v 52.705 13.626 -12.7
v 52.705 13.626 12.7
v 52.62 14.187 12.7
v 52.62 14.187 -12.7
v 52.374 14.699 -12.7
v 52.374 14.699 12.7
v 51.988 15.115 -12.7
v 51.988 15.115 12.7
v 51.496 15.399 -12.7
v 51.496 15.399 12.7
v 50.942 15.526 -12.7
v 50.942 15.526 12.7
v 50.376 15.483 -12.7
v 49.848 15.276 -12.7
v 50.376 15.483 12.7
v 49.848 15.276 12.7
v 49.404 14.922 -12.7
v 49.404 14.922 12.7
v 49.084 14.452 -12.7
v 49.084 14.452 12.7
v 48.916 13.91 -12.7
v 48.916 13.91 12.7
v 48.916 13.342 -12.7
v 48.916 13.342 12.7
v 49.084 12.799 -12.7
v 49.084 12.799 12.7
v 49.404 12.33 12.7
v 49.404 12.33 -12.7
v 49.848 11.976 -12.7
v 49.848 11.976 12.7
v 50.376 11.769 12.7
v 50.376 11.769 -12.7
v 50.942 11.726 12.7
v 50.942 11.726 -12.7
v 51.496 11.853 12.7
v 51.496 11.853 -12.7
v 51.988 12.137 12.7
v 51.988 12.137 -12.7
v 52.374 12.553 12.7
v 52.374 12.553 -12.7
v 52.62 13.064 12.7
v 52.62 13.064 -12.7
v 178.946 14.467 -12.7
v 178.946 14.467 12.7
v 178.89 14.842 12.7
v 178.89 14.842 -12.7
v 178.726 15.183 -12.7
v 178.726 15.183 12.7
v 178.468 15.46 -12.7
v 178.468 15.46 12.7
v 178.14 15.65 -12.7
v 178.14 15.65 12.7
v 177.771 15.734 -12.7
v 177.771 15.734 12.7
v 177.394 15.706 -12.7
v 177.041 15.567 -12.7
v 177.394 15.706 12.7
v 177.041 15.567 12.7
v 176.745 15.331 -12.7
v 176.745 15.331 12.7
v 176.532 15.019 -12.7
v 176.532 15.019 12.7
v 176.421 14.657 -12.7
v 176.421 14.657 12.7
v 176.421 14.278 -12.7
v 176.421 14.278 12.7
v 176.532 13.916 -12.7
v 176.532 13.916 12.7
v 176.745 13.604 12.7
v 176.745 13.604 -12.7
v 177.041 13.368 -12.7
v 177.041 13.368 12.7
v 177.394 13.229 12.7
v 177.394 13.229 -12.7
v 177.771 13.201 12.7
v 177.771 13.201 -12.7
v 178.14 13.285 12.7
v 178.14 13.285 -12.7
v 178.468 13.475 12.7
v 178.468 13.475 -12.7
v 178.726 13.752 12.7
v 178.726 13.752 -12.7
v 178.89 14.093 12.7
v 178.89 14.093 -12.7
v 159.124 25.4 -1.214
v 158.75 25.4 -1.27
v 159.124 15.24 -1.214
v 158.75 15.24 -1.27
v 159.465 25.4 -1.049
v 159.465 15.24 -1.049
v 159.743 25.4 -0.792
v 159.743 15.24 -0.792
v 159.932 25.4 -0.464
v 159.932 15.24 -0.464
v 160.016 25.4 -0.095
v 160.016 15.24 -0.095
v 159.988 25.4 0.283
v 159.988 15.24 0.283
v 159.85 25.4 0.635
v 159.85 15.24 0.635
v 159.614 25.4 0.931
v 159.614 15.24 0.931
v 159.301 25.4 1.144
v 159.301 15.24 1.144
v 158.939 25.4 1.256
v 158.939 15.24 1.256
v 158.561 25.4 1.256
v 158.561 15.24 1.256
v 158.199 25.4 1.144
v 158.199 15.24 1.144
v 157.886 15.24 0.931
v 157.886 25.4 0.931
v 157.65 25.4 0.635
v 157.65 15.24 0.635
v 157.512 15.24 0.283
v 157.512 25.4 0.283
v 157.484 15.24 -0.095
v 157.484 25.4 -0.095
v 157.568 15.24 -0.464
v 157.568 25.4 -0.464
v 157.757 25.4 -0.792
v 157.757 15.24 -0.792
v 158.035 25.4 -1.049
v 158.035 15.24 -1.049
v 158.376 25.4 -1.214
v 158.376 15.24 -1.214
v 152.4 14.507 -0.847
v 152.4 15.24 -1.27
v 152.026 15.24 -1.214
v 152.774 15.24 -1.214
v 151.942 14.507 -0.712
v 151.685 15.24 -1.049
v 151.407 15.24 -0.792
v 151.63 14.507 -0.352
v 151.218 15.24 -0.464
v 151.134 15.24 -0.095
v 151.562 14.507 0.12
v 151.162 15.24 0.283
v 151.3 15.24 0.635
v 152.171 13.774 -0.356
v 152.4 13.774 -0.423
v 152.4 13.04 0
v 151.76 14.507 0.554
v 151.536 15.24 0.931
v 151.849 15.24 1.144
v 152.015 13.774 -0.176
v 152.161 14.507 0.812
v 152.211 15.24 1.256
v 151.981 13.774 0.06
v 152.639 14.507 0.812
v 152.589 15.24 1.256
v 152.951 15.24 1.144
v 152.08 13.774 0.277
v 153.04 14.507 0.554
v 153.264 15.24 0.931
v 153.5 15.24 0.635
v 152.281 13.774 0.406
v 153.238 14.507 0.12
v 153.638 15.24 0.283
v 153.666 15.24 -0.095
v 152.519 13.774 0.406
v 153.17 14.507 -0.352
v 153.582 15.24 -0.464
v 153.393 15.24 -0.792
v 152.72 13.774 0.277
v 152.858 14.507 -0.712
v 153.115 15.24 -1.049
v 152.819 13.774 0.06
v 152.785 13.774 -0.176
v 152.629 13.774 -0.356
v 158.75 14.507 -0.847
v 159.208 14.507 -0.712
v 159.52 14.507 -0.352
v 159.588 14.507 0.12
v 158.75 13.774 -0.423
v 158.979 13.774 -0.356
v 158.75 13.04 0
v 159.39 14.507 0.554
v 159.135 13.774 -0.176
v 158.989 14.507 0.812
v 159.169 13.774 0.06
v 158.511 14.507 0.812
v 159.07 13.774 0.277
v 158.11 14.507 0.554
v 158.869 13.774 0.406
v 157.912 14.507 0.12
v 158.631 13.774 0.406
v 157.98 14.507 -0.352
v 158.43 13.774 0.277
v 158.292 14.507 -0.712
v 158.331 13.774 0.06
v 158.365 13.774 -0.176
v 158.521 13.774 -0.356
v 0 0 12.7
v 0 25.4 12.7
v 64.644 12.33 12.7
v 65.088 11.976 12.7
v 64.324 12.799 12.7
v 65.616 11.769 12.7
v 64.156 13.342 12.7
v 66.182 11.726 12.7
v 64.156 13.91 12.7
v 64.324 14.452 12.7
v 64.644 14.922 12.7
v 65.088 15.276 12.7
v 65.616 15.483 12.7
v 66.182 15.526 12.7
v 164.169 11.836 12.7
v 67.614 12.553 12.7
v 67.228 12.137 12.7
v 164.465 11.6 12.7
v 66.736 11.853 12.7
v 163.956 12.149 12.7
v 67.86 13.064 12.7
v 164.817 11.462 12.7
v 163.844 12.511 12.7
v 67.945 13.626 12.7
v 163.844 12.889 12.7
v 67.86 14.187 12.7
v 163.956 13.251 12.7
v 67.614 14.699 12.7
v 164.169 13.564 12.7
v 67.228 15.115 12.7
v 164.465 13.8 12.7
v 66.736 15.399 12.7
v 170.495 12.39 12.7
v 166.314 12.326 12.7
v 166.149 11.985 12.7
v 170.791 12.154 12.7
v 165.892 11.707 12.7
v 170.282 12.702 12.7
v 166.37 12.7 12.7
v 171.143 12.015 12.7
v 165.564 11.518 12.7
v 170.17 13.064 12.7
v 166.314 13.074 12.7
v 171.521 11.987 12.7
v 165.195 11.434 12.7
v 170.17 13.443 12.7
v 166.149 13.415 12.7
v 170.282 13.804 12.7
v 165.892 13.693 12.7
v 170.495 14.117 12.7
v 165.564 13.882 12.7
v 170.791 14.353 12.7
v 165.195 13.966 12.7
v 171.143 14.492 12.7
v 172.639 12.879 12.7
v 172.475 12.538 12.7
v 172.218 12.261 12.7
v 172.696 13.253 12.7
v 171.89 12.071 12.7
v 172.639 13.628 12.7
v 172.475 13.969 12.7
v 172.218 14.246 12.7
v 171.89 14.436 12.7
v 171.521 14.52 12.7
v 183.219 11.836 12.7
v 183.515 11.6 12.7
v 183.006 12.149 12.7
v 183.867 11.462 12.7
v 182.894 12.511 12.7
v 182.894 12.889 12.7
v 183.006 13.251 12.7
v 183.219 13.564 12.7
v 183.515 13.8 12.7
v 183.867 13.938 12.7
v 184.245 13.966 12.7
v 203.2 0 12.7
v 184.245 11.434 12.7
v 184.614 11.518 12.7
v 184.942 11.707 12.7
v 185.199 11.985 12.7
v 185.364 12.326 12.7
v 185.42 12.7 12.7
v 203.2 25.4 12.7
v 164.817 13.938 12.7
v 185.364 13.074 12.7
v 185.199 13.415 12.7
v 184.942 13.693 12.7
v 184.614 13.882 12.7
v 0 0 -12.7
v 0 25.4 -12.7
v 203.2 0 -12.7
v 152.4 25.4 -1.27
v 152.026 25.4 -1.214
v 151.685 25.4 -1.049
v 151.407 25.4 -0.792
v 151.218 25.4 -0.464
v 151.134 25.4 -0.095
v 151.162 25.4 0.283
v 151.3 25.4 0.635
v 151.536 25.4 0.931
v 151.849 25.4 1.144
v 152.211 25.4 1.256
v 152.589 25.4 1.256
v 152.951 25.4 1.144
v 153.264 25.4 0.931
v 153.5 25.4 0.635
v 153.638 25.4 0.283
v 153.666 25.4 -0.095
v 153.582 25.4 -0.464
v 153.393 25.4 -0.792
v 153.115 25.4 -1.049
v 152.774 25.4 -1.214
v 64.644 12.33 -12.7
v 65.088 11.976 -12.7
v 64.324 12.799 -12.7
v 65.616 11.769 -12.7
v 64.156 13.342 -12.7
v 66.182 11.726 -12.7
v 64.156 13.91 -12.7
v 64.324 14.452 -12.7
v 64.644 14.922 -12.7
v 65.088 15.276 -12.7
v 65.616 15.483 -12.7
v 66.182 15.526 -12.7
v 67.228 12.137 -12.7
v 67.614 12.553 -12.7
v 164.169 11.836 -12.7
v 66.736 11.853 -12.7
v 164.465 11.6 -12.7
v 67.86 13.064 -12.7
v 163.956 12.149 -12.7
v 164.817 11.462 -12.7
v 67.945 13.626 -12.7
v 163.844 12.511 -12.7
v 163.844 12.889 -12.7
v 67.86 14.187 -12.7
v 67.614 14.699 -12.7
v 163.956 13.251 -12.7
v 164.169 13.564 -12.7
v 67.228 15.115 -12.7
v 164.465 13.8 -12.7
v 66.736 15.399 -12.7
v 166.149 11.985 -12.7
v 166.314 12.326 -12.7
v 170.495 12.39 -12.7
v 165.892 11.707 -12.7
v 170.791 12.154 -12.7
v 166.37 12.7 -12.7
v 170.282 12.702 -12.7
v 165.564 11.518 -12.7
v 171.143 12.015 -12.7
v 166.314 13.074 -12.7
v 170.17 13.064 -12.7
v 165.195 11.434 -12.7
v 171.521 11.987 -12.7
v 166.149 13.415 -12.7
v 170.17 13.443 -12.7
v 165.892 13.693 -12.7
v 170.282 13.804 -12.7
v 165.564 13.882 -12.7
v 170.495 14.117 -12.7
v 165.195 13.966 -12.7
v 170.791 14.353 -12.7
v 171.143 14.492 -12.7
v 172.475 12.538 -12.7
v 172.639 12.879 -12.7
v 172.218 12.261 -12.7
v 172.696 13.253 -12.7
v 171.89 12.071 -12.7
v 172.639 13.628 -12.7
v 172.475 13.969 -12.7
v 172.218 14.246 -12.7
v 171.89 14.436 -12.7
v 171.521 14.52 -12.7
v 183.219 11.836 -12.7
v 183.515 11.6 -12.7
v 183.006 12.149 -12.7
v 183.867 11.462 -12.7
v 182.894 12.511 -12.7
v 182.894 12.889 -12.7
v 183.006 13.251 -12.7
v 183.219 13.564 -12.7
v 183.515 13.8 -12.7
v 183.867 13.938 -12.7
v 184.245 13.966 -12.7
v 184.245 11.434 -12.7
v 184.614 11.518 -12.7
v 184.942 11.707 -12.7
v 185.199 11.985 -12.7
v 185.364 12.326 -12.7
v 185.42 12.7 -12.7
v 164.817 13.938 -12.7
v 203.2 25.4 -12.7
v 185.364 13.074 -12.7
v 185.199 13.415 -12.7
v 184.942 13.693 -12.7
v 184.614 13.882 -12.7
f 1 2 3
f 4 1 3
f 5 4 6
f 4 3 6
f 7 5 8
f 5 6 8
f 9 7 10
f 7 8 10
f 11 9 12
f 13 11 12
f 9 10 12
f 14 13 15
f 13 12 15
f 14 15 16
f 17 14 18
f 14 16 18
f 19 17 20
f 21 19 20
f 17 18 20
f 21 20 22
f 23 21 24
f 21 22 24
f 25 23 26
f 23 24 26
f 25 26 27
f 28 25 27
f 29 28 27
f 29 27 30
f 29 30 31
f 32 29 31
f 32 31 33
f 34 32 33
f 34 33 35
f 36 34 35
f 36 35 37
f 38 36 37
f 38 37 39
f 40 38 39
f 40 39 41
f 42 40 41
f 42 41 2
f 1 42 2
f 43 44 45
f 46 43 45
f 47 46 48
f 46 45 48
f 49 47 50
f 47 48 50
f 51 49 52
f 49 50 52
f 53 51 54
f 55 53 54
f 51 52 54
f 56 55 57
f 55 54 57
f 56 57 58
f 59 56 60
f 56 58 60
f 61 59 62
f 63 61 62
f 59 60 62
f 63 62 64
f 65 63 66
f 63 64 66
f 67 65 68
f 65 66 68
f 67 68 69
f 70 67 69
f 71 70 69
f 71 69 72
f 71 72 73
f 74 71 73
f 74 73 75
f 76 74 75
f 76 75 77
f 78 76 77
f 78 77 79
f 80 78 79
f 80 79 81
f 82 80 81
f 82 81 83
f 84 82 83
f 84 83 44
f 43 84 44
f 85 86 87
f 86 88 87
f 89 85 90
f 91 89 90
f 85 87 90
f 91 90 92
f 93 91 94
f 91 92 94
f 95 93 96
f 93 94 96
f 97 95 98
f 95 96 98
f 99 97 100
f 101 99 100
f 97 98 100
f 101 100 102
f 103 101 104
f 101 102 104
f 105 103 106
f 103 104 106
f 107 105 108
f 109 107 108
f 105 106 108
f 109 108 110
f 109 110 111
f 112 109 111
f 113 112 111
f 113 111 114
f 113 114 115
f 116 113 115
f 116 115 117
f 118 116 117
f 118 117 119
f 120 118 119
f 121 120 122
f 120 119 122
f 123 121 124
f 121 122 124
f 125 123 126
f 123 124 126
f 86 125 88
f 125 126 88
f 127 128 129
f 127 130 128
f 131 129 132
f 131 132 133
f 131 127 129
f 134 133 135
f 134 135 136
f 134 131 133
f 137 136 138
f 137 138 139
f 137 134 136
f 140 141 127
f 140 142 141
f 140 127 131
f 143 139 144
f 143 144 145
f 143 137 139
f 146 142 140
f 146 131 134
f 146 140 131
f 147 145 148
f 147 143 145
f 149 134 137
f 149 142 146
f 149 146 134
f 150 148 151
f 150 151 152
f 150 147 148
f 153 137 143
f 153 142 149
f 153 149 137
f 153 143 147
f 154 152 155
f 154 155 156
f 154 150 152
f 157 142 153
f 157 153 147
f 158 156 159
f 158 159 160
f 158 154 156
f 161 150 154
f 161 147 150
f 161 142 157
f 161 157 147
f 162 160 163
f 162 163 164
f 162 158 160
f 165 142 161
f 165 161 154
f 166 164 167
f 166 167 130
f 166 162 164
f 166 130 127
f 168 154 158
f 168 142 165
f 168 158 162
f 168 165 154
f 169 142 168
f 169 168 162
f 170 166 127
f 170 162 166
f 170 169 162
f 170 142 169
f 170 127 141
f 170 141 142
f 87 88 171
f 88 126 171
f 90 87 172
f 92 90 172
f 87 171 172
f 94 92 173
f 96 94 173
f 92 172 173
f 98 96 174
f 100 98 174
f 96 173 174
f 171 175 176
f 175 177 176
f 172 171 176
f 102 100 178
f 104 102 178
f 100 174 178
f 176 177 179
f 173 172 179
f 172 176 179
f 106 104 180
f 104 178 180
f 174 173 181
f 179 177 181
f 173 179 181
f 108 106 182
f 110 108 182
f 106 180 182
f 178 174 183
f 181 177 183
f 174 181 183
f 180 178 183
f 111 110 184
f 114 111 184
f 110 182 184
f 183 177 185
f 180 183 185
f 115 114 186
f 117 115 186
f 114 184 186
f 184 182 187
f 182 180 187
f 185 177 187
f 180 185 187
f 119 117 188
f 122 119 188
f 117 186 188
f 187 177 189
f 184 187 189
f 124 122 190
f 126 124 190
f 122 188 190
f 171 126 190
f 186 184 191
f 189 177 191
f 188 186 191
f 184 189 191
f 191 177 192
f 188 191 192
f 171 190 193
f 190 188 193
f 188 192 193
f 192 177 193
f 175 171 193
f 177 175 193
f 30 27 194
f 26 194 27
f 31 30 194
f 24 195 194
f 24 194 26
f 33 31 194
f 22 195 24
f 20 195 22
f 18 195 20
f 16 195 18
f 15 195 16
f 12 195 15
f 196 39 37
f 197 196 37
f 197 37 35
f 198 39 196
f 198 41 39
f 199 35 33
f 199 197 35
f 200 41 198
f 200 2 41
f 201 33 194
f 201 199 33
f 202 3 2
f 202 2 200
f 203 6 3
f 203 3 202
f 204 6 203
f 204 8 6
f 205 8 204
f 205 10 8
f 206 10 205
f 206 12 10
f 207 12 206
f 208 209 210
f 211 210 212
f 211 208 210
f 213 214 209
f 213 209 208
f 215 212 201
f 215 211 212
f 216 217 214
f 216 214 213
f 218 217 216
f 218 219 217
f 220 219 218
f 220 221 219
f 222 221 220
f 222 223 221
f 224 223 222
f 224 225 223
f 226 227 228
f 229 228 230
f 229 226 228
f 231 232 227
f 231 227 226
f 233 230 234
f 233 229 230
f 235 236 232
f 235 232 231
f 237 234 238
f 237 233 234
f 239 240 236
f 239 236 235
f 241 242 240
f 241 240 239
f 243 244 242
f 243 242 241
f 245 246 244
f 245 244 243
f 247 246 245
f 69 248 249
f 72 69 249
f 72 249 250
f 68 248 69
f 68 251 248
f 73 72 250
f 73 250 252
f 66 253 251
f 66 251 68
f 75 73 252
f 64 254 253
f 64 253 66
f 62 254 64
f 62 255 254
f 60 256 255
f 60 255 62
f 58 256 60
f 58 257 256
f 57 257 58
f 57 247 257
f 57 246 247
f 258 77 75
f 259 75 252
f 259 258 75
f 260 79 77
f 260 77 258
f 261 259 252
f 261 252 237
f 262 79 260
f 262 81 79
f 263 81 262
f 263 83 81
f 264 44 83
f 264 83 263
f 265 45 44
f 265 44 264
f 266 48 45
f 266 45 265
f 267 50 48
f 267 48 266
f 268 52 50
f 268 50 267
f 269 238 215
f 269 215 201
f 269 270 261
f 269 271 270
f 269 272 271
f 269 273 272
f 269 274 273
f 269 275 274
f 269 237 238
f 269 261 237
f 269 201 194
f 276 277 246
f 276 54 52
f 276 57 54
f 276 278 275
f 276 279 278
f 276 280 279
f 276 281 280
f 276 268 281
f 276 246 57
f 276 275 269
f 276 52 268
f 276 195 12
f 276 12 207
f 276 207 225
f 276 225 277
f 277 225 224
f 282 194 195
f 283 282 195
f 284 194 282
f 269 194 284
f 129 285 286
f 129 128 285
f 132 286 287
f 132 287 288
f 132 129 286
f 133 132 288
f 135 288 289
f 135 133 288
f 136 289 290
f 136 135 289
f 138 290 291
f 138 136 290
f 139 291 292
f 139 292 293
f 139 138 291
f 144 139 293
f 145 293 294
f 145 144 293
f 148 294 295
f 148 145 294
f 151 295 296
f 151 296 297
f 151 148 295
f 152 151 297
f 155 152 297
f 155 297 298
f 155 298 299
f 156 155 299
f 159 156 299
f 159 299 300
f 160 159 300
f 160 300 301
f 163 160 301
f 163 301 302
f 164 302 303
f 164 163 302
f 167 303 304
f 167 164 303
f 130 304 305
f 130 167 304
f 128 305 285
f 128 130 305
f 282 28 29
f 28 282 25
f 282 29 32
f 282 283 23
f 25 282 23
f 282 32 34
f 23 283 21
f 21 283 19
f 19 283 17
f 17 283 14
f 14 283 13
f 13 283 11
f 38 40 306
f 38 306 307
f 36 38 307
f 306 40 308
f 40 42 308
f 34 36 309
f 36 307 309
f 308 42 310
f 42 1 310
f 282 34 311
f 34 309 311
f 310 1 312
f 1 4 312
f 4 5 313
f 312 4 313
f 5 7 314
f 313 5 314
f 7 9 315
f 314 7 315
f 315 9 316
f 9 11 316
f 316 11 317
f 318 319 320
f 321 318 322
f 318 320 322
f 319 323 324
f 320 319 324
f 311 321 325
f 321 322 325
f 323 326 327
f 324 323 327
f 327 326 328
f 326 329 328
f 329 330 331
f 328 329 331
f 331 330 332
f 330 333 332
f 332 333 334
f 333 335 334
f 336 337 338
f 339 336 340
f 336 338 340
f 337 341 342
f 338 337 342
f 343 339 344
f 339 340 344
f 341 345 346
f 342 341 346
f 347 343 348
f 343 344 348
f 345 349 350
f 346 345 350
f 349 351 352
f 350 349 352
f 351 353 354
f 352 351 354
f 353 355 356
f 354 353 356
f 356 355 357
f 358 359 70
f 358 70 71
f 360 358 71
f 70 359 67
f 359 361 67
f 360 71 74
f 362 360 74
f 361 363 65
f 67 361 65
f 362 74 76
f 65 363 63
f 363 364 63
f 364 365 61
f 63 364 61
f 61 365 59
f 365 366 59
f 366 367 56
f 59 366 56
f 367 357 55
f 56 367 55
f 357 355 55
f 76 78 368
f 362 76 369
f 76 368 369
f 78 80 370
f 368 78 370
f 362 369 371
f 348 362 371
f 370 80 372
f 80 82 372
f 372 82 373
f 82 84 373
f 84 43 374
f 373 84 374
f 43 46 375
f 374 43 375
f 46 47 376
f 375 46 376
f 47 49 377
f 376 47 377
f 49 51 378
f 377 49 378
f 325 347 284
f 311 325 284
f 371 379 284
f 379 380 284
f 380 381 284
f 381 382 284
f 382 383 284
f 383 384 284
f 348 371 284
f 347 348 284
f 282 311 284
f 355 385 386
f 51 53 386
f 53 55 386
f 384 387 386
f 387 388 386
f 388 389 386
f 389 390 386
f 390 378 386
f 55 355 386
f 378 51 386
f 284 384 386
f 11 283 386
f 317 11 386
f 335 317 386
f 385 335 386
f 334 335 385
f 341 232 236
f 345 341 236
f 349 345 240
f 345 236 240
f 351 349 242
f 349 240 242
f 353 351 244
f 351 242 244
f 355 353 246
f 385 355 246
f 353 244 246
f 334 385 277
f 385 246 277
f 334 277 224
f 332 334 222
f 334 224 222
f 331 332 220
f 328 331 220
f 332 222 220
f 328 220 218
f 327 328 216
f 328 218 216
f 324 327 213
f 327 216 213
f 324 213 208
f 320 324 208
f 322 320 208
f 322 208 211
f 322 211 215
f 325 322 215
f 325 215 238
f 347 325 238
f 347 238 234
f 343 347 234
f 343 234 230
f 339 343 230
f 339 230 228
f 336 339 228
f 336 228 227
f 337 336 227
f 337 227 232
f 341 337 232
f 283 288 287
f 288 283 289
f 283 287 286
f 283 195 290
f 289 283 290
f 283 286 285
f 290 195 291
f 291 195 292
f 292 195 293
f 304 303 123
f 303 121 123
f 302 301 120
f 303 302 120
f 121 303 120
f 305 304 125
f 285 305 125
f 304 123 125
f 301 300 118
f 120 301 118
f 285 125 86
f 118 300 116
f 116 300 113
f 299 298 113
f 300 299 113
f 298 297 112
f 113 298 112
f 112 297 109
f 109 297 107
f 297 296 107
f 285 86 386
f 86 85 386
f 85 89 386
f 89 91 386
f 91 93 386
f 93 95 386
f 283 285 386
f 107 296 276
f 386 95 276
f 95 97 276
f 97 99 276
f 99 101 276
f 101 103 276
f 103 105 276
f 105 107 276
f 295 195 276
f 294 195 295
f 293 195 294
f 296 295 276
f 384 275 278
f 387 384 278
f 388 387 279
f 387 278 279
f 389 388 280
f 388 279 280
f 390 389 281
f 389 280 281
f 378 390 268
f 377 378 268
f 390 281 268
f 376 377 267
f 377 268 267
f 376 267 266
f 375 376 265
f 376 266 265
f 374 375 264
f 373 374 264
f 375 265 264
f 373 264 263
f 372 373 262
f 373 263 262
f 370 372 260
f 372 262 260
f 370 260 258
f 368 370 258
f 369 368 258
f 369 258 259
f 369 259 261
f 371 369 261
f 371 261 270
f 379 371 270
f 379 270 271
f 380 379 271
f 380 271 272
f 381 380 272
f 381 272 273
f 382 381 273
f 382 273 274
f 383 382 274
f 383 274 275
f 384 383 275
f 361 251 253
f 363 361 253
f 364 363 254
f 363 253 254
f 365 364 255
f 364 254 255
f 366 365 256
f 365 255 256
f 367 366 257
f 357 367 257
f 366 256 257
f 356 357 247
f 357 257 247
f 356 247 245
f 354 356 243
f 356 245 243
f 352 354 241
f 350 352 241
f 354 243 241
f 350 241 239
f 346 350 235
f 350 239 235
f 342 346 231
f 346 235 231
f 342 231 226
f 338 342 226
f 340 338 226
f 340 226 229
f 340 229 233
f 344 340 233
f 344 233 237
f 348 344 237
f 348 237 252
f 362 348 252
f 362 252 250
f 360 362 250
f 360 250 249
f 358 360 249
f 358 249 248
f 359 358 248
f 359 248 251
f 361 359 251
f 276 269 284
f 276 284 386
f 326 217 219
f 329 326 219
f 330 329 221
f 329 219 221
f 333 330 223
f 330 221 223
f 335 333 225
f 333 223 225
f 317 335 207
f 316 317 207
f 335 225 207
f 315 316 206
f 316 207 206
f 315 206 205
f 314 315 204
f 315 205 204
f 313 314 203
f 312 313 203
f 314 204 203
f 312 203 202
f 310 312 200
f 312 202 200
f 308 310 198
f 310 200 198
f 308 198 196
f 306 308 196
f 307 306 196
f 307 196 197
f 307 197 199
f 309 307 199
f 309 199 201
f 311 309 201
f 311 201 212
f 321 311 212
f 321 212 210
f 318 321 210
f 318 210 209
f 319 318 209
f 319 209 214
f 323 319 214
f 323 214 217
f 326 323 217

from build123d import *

# Parameters (mm, degrees)
SKETCH2_W           = 203.2
SKETCH2_H           = 25.4
BOSS_EXTRUDE1_DEPTH = 12.7
SKETCH13_R          = 1.27
CUT_EXTRUDE2_DEPTH  = 207.350575478
SKETCH16_R          = 1.905
CUT_EXTRUDE4_DEPTH  = 207.350575478


with BuildPart() as part:
    # Sketch2 → Boss-Extrude1 (new, symmetric)
    with BuildSketch(Plane.XY):
        with Locations((101.6, 12.7)):
            Rectangle(SKETCH2_W, SKETCH2_H)
    extrude(amount=BOSS_EXTRUDE1_DEPTH, both=True)

    # Sketch13 → Cut-Extrude2 (cut, through all)
    with BuildSketch(Plane.XY.offset(12.7)):
        with Locations((165.1, 12.7)):
            Circle(SKETCH13_R)
        with Locations((184.15, 12.7)):
            Circle(SKETCH13_R)
        with Locations((171.425836333, 13.253438966)):
            Circle(SKETCH13_R)
        with Locations((177.676404473, 14.467498382)):
            Circle(SKETCH13_R)
    extrude(amount=-CUT_EXTRUDE2_DEPTH, mode=Mode.SUBTRACT)

    # Sketch18 → Cut-Revolve2 (revolve, cut)
    with BuildSketch(Plane.XY, mode=Mode.PRIVATE) as cut_revolve2_sk:
        Polygon((152.4, 25.4), (153.67, 25.4), (153.67, 15.24), (152.4, 13.040295474), align=None)
    cut_revolve2 = revolve(cut_revolve2_sk.sketch.rotate(Axis((152.4, 13.040295474, 0), (0, 1, 0)), 90), axis=Axis((152.4, 13.040295474, 0), (0, 1, 0)), mode=Mode.SUBTRACT)

    # Mirror2: Cut-Revolve2 across plane
    add(cut_revolve2.mirror(Plane(origin=(155.575, 0, 0), x_dir=(0, 0, 1), z_dir=(1, 0, 0))), mode=Mode.SUBTRACT)

    # Sketch16 → Cut-Extrude4 (cut, through all)
    with BuildSketch(Plane.XY.offset(12.7)):
        with Locations((50.8, 13.625917973)):
            Circle(SKETCH16_R)
        with Locations((66.04, 13.625917973)):
            Circle(SKETCH16_R)
    extrude(amount=-CUT_EXTRUDE4_DEPTH, mode=Mode.SUBTRACT)


solid = part.part
